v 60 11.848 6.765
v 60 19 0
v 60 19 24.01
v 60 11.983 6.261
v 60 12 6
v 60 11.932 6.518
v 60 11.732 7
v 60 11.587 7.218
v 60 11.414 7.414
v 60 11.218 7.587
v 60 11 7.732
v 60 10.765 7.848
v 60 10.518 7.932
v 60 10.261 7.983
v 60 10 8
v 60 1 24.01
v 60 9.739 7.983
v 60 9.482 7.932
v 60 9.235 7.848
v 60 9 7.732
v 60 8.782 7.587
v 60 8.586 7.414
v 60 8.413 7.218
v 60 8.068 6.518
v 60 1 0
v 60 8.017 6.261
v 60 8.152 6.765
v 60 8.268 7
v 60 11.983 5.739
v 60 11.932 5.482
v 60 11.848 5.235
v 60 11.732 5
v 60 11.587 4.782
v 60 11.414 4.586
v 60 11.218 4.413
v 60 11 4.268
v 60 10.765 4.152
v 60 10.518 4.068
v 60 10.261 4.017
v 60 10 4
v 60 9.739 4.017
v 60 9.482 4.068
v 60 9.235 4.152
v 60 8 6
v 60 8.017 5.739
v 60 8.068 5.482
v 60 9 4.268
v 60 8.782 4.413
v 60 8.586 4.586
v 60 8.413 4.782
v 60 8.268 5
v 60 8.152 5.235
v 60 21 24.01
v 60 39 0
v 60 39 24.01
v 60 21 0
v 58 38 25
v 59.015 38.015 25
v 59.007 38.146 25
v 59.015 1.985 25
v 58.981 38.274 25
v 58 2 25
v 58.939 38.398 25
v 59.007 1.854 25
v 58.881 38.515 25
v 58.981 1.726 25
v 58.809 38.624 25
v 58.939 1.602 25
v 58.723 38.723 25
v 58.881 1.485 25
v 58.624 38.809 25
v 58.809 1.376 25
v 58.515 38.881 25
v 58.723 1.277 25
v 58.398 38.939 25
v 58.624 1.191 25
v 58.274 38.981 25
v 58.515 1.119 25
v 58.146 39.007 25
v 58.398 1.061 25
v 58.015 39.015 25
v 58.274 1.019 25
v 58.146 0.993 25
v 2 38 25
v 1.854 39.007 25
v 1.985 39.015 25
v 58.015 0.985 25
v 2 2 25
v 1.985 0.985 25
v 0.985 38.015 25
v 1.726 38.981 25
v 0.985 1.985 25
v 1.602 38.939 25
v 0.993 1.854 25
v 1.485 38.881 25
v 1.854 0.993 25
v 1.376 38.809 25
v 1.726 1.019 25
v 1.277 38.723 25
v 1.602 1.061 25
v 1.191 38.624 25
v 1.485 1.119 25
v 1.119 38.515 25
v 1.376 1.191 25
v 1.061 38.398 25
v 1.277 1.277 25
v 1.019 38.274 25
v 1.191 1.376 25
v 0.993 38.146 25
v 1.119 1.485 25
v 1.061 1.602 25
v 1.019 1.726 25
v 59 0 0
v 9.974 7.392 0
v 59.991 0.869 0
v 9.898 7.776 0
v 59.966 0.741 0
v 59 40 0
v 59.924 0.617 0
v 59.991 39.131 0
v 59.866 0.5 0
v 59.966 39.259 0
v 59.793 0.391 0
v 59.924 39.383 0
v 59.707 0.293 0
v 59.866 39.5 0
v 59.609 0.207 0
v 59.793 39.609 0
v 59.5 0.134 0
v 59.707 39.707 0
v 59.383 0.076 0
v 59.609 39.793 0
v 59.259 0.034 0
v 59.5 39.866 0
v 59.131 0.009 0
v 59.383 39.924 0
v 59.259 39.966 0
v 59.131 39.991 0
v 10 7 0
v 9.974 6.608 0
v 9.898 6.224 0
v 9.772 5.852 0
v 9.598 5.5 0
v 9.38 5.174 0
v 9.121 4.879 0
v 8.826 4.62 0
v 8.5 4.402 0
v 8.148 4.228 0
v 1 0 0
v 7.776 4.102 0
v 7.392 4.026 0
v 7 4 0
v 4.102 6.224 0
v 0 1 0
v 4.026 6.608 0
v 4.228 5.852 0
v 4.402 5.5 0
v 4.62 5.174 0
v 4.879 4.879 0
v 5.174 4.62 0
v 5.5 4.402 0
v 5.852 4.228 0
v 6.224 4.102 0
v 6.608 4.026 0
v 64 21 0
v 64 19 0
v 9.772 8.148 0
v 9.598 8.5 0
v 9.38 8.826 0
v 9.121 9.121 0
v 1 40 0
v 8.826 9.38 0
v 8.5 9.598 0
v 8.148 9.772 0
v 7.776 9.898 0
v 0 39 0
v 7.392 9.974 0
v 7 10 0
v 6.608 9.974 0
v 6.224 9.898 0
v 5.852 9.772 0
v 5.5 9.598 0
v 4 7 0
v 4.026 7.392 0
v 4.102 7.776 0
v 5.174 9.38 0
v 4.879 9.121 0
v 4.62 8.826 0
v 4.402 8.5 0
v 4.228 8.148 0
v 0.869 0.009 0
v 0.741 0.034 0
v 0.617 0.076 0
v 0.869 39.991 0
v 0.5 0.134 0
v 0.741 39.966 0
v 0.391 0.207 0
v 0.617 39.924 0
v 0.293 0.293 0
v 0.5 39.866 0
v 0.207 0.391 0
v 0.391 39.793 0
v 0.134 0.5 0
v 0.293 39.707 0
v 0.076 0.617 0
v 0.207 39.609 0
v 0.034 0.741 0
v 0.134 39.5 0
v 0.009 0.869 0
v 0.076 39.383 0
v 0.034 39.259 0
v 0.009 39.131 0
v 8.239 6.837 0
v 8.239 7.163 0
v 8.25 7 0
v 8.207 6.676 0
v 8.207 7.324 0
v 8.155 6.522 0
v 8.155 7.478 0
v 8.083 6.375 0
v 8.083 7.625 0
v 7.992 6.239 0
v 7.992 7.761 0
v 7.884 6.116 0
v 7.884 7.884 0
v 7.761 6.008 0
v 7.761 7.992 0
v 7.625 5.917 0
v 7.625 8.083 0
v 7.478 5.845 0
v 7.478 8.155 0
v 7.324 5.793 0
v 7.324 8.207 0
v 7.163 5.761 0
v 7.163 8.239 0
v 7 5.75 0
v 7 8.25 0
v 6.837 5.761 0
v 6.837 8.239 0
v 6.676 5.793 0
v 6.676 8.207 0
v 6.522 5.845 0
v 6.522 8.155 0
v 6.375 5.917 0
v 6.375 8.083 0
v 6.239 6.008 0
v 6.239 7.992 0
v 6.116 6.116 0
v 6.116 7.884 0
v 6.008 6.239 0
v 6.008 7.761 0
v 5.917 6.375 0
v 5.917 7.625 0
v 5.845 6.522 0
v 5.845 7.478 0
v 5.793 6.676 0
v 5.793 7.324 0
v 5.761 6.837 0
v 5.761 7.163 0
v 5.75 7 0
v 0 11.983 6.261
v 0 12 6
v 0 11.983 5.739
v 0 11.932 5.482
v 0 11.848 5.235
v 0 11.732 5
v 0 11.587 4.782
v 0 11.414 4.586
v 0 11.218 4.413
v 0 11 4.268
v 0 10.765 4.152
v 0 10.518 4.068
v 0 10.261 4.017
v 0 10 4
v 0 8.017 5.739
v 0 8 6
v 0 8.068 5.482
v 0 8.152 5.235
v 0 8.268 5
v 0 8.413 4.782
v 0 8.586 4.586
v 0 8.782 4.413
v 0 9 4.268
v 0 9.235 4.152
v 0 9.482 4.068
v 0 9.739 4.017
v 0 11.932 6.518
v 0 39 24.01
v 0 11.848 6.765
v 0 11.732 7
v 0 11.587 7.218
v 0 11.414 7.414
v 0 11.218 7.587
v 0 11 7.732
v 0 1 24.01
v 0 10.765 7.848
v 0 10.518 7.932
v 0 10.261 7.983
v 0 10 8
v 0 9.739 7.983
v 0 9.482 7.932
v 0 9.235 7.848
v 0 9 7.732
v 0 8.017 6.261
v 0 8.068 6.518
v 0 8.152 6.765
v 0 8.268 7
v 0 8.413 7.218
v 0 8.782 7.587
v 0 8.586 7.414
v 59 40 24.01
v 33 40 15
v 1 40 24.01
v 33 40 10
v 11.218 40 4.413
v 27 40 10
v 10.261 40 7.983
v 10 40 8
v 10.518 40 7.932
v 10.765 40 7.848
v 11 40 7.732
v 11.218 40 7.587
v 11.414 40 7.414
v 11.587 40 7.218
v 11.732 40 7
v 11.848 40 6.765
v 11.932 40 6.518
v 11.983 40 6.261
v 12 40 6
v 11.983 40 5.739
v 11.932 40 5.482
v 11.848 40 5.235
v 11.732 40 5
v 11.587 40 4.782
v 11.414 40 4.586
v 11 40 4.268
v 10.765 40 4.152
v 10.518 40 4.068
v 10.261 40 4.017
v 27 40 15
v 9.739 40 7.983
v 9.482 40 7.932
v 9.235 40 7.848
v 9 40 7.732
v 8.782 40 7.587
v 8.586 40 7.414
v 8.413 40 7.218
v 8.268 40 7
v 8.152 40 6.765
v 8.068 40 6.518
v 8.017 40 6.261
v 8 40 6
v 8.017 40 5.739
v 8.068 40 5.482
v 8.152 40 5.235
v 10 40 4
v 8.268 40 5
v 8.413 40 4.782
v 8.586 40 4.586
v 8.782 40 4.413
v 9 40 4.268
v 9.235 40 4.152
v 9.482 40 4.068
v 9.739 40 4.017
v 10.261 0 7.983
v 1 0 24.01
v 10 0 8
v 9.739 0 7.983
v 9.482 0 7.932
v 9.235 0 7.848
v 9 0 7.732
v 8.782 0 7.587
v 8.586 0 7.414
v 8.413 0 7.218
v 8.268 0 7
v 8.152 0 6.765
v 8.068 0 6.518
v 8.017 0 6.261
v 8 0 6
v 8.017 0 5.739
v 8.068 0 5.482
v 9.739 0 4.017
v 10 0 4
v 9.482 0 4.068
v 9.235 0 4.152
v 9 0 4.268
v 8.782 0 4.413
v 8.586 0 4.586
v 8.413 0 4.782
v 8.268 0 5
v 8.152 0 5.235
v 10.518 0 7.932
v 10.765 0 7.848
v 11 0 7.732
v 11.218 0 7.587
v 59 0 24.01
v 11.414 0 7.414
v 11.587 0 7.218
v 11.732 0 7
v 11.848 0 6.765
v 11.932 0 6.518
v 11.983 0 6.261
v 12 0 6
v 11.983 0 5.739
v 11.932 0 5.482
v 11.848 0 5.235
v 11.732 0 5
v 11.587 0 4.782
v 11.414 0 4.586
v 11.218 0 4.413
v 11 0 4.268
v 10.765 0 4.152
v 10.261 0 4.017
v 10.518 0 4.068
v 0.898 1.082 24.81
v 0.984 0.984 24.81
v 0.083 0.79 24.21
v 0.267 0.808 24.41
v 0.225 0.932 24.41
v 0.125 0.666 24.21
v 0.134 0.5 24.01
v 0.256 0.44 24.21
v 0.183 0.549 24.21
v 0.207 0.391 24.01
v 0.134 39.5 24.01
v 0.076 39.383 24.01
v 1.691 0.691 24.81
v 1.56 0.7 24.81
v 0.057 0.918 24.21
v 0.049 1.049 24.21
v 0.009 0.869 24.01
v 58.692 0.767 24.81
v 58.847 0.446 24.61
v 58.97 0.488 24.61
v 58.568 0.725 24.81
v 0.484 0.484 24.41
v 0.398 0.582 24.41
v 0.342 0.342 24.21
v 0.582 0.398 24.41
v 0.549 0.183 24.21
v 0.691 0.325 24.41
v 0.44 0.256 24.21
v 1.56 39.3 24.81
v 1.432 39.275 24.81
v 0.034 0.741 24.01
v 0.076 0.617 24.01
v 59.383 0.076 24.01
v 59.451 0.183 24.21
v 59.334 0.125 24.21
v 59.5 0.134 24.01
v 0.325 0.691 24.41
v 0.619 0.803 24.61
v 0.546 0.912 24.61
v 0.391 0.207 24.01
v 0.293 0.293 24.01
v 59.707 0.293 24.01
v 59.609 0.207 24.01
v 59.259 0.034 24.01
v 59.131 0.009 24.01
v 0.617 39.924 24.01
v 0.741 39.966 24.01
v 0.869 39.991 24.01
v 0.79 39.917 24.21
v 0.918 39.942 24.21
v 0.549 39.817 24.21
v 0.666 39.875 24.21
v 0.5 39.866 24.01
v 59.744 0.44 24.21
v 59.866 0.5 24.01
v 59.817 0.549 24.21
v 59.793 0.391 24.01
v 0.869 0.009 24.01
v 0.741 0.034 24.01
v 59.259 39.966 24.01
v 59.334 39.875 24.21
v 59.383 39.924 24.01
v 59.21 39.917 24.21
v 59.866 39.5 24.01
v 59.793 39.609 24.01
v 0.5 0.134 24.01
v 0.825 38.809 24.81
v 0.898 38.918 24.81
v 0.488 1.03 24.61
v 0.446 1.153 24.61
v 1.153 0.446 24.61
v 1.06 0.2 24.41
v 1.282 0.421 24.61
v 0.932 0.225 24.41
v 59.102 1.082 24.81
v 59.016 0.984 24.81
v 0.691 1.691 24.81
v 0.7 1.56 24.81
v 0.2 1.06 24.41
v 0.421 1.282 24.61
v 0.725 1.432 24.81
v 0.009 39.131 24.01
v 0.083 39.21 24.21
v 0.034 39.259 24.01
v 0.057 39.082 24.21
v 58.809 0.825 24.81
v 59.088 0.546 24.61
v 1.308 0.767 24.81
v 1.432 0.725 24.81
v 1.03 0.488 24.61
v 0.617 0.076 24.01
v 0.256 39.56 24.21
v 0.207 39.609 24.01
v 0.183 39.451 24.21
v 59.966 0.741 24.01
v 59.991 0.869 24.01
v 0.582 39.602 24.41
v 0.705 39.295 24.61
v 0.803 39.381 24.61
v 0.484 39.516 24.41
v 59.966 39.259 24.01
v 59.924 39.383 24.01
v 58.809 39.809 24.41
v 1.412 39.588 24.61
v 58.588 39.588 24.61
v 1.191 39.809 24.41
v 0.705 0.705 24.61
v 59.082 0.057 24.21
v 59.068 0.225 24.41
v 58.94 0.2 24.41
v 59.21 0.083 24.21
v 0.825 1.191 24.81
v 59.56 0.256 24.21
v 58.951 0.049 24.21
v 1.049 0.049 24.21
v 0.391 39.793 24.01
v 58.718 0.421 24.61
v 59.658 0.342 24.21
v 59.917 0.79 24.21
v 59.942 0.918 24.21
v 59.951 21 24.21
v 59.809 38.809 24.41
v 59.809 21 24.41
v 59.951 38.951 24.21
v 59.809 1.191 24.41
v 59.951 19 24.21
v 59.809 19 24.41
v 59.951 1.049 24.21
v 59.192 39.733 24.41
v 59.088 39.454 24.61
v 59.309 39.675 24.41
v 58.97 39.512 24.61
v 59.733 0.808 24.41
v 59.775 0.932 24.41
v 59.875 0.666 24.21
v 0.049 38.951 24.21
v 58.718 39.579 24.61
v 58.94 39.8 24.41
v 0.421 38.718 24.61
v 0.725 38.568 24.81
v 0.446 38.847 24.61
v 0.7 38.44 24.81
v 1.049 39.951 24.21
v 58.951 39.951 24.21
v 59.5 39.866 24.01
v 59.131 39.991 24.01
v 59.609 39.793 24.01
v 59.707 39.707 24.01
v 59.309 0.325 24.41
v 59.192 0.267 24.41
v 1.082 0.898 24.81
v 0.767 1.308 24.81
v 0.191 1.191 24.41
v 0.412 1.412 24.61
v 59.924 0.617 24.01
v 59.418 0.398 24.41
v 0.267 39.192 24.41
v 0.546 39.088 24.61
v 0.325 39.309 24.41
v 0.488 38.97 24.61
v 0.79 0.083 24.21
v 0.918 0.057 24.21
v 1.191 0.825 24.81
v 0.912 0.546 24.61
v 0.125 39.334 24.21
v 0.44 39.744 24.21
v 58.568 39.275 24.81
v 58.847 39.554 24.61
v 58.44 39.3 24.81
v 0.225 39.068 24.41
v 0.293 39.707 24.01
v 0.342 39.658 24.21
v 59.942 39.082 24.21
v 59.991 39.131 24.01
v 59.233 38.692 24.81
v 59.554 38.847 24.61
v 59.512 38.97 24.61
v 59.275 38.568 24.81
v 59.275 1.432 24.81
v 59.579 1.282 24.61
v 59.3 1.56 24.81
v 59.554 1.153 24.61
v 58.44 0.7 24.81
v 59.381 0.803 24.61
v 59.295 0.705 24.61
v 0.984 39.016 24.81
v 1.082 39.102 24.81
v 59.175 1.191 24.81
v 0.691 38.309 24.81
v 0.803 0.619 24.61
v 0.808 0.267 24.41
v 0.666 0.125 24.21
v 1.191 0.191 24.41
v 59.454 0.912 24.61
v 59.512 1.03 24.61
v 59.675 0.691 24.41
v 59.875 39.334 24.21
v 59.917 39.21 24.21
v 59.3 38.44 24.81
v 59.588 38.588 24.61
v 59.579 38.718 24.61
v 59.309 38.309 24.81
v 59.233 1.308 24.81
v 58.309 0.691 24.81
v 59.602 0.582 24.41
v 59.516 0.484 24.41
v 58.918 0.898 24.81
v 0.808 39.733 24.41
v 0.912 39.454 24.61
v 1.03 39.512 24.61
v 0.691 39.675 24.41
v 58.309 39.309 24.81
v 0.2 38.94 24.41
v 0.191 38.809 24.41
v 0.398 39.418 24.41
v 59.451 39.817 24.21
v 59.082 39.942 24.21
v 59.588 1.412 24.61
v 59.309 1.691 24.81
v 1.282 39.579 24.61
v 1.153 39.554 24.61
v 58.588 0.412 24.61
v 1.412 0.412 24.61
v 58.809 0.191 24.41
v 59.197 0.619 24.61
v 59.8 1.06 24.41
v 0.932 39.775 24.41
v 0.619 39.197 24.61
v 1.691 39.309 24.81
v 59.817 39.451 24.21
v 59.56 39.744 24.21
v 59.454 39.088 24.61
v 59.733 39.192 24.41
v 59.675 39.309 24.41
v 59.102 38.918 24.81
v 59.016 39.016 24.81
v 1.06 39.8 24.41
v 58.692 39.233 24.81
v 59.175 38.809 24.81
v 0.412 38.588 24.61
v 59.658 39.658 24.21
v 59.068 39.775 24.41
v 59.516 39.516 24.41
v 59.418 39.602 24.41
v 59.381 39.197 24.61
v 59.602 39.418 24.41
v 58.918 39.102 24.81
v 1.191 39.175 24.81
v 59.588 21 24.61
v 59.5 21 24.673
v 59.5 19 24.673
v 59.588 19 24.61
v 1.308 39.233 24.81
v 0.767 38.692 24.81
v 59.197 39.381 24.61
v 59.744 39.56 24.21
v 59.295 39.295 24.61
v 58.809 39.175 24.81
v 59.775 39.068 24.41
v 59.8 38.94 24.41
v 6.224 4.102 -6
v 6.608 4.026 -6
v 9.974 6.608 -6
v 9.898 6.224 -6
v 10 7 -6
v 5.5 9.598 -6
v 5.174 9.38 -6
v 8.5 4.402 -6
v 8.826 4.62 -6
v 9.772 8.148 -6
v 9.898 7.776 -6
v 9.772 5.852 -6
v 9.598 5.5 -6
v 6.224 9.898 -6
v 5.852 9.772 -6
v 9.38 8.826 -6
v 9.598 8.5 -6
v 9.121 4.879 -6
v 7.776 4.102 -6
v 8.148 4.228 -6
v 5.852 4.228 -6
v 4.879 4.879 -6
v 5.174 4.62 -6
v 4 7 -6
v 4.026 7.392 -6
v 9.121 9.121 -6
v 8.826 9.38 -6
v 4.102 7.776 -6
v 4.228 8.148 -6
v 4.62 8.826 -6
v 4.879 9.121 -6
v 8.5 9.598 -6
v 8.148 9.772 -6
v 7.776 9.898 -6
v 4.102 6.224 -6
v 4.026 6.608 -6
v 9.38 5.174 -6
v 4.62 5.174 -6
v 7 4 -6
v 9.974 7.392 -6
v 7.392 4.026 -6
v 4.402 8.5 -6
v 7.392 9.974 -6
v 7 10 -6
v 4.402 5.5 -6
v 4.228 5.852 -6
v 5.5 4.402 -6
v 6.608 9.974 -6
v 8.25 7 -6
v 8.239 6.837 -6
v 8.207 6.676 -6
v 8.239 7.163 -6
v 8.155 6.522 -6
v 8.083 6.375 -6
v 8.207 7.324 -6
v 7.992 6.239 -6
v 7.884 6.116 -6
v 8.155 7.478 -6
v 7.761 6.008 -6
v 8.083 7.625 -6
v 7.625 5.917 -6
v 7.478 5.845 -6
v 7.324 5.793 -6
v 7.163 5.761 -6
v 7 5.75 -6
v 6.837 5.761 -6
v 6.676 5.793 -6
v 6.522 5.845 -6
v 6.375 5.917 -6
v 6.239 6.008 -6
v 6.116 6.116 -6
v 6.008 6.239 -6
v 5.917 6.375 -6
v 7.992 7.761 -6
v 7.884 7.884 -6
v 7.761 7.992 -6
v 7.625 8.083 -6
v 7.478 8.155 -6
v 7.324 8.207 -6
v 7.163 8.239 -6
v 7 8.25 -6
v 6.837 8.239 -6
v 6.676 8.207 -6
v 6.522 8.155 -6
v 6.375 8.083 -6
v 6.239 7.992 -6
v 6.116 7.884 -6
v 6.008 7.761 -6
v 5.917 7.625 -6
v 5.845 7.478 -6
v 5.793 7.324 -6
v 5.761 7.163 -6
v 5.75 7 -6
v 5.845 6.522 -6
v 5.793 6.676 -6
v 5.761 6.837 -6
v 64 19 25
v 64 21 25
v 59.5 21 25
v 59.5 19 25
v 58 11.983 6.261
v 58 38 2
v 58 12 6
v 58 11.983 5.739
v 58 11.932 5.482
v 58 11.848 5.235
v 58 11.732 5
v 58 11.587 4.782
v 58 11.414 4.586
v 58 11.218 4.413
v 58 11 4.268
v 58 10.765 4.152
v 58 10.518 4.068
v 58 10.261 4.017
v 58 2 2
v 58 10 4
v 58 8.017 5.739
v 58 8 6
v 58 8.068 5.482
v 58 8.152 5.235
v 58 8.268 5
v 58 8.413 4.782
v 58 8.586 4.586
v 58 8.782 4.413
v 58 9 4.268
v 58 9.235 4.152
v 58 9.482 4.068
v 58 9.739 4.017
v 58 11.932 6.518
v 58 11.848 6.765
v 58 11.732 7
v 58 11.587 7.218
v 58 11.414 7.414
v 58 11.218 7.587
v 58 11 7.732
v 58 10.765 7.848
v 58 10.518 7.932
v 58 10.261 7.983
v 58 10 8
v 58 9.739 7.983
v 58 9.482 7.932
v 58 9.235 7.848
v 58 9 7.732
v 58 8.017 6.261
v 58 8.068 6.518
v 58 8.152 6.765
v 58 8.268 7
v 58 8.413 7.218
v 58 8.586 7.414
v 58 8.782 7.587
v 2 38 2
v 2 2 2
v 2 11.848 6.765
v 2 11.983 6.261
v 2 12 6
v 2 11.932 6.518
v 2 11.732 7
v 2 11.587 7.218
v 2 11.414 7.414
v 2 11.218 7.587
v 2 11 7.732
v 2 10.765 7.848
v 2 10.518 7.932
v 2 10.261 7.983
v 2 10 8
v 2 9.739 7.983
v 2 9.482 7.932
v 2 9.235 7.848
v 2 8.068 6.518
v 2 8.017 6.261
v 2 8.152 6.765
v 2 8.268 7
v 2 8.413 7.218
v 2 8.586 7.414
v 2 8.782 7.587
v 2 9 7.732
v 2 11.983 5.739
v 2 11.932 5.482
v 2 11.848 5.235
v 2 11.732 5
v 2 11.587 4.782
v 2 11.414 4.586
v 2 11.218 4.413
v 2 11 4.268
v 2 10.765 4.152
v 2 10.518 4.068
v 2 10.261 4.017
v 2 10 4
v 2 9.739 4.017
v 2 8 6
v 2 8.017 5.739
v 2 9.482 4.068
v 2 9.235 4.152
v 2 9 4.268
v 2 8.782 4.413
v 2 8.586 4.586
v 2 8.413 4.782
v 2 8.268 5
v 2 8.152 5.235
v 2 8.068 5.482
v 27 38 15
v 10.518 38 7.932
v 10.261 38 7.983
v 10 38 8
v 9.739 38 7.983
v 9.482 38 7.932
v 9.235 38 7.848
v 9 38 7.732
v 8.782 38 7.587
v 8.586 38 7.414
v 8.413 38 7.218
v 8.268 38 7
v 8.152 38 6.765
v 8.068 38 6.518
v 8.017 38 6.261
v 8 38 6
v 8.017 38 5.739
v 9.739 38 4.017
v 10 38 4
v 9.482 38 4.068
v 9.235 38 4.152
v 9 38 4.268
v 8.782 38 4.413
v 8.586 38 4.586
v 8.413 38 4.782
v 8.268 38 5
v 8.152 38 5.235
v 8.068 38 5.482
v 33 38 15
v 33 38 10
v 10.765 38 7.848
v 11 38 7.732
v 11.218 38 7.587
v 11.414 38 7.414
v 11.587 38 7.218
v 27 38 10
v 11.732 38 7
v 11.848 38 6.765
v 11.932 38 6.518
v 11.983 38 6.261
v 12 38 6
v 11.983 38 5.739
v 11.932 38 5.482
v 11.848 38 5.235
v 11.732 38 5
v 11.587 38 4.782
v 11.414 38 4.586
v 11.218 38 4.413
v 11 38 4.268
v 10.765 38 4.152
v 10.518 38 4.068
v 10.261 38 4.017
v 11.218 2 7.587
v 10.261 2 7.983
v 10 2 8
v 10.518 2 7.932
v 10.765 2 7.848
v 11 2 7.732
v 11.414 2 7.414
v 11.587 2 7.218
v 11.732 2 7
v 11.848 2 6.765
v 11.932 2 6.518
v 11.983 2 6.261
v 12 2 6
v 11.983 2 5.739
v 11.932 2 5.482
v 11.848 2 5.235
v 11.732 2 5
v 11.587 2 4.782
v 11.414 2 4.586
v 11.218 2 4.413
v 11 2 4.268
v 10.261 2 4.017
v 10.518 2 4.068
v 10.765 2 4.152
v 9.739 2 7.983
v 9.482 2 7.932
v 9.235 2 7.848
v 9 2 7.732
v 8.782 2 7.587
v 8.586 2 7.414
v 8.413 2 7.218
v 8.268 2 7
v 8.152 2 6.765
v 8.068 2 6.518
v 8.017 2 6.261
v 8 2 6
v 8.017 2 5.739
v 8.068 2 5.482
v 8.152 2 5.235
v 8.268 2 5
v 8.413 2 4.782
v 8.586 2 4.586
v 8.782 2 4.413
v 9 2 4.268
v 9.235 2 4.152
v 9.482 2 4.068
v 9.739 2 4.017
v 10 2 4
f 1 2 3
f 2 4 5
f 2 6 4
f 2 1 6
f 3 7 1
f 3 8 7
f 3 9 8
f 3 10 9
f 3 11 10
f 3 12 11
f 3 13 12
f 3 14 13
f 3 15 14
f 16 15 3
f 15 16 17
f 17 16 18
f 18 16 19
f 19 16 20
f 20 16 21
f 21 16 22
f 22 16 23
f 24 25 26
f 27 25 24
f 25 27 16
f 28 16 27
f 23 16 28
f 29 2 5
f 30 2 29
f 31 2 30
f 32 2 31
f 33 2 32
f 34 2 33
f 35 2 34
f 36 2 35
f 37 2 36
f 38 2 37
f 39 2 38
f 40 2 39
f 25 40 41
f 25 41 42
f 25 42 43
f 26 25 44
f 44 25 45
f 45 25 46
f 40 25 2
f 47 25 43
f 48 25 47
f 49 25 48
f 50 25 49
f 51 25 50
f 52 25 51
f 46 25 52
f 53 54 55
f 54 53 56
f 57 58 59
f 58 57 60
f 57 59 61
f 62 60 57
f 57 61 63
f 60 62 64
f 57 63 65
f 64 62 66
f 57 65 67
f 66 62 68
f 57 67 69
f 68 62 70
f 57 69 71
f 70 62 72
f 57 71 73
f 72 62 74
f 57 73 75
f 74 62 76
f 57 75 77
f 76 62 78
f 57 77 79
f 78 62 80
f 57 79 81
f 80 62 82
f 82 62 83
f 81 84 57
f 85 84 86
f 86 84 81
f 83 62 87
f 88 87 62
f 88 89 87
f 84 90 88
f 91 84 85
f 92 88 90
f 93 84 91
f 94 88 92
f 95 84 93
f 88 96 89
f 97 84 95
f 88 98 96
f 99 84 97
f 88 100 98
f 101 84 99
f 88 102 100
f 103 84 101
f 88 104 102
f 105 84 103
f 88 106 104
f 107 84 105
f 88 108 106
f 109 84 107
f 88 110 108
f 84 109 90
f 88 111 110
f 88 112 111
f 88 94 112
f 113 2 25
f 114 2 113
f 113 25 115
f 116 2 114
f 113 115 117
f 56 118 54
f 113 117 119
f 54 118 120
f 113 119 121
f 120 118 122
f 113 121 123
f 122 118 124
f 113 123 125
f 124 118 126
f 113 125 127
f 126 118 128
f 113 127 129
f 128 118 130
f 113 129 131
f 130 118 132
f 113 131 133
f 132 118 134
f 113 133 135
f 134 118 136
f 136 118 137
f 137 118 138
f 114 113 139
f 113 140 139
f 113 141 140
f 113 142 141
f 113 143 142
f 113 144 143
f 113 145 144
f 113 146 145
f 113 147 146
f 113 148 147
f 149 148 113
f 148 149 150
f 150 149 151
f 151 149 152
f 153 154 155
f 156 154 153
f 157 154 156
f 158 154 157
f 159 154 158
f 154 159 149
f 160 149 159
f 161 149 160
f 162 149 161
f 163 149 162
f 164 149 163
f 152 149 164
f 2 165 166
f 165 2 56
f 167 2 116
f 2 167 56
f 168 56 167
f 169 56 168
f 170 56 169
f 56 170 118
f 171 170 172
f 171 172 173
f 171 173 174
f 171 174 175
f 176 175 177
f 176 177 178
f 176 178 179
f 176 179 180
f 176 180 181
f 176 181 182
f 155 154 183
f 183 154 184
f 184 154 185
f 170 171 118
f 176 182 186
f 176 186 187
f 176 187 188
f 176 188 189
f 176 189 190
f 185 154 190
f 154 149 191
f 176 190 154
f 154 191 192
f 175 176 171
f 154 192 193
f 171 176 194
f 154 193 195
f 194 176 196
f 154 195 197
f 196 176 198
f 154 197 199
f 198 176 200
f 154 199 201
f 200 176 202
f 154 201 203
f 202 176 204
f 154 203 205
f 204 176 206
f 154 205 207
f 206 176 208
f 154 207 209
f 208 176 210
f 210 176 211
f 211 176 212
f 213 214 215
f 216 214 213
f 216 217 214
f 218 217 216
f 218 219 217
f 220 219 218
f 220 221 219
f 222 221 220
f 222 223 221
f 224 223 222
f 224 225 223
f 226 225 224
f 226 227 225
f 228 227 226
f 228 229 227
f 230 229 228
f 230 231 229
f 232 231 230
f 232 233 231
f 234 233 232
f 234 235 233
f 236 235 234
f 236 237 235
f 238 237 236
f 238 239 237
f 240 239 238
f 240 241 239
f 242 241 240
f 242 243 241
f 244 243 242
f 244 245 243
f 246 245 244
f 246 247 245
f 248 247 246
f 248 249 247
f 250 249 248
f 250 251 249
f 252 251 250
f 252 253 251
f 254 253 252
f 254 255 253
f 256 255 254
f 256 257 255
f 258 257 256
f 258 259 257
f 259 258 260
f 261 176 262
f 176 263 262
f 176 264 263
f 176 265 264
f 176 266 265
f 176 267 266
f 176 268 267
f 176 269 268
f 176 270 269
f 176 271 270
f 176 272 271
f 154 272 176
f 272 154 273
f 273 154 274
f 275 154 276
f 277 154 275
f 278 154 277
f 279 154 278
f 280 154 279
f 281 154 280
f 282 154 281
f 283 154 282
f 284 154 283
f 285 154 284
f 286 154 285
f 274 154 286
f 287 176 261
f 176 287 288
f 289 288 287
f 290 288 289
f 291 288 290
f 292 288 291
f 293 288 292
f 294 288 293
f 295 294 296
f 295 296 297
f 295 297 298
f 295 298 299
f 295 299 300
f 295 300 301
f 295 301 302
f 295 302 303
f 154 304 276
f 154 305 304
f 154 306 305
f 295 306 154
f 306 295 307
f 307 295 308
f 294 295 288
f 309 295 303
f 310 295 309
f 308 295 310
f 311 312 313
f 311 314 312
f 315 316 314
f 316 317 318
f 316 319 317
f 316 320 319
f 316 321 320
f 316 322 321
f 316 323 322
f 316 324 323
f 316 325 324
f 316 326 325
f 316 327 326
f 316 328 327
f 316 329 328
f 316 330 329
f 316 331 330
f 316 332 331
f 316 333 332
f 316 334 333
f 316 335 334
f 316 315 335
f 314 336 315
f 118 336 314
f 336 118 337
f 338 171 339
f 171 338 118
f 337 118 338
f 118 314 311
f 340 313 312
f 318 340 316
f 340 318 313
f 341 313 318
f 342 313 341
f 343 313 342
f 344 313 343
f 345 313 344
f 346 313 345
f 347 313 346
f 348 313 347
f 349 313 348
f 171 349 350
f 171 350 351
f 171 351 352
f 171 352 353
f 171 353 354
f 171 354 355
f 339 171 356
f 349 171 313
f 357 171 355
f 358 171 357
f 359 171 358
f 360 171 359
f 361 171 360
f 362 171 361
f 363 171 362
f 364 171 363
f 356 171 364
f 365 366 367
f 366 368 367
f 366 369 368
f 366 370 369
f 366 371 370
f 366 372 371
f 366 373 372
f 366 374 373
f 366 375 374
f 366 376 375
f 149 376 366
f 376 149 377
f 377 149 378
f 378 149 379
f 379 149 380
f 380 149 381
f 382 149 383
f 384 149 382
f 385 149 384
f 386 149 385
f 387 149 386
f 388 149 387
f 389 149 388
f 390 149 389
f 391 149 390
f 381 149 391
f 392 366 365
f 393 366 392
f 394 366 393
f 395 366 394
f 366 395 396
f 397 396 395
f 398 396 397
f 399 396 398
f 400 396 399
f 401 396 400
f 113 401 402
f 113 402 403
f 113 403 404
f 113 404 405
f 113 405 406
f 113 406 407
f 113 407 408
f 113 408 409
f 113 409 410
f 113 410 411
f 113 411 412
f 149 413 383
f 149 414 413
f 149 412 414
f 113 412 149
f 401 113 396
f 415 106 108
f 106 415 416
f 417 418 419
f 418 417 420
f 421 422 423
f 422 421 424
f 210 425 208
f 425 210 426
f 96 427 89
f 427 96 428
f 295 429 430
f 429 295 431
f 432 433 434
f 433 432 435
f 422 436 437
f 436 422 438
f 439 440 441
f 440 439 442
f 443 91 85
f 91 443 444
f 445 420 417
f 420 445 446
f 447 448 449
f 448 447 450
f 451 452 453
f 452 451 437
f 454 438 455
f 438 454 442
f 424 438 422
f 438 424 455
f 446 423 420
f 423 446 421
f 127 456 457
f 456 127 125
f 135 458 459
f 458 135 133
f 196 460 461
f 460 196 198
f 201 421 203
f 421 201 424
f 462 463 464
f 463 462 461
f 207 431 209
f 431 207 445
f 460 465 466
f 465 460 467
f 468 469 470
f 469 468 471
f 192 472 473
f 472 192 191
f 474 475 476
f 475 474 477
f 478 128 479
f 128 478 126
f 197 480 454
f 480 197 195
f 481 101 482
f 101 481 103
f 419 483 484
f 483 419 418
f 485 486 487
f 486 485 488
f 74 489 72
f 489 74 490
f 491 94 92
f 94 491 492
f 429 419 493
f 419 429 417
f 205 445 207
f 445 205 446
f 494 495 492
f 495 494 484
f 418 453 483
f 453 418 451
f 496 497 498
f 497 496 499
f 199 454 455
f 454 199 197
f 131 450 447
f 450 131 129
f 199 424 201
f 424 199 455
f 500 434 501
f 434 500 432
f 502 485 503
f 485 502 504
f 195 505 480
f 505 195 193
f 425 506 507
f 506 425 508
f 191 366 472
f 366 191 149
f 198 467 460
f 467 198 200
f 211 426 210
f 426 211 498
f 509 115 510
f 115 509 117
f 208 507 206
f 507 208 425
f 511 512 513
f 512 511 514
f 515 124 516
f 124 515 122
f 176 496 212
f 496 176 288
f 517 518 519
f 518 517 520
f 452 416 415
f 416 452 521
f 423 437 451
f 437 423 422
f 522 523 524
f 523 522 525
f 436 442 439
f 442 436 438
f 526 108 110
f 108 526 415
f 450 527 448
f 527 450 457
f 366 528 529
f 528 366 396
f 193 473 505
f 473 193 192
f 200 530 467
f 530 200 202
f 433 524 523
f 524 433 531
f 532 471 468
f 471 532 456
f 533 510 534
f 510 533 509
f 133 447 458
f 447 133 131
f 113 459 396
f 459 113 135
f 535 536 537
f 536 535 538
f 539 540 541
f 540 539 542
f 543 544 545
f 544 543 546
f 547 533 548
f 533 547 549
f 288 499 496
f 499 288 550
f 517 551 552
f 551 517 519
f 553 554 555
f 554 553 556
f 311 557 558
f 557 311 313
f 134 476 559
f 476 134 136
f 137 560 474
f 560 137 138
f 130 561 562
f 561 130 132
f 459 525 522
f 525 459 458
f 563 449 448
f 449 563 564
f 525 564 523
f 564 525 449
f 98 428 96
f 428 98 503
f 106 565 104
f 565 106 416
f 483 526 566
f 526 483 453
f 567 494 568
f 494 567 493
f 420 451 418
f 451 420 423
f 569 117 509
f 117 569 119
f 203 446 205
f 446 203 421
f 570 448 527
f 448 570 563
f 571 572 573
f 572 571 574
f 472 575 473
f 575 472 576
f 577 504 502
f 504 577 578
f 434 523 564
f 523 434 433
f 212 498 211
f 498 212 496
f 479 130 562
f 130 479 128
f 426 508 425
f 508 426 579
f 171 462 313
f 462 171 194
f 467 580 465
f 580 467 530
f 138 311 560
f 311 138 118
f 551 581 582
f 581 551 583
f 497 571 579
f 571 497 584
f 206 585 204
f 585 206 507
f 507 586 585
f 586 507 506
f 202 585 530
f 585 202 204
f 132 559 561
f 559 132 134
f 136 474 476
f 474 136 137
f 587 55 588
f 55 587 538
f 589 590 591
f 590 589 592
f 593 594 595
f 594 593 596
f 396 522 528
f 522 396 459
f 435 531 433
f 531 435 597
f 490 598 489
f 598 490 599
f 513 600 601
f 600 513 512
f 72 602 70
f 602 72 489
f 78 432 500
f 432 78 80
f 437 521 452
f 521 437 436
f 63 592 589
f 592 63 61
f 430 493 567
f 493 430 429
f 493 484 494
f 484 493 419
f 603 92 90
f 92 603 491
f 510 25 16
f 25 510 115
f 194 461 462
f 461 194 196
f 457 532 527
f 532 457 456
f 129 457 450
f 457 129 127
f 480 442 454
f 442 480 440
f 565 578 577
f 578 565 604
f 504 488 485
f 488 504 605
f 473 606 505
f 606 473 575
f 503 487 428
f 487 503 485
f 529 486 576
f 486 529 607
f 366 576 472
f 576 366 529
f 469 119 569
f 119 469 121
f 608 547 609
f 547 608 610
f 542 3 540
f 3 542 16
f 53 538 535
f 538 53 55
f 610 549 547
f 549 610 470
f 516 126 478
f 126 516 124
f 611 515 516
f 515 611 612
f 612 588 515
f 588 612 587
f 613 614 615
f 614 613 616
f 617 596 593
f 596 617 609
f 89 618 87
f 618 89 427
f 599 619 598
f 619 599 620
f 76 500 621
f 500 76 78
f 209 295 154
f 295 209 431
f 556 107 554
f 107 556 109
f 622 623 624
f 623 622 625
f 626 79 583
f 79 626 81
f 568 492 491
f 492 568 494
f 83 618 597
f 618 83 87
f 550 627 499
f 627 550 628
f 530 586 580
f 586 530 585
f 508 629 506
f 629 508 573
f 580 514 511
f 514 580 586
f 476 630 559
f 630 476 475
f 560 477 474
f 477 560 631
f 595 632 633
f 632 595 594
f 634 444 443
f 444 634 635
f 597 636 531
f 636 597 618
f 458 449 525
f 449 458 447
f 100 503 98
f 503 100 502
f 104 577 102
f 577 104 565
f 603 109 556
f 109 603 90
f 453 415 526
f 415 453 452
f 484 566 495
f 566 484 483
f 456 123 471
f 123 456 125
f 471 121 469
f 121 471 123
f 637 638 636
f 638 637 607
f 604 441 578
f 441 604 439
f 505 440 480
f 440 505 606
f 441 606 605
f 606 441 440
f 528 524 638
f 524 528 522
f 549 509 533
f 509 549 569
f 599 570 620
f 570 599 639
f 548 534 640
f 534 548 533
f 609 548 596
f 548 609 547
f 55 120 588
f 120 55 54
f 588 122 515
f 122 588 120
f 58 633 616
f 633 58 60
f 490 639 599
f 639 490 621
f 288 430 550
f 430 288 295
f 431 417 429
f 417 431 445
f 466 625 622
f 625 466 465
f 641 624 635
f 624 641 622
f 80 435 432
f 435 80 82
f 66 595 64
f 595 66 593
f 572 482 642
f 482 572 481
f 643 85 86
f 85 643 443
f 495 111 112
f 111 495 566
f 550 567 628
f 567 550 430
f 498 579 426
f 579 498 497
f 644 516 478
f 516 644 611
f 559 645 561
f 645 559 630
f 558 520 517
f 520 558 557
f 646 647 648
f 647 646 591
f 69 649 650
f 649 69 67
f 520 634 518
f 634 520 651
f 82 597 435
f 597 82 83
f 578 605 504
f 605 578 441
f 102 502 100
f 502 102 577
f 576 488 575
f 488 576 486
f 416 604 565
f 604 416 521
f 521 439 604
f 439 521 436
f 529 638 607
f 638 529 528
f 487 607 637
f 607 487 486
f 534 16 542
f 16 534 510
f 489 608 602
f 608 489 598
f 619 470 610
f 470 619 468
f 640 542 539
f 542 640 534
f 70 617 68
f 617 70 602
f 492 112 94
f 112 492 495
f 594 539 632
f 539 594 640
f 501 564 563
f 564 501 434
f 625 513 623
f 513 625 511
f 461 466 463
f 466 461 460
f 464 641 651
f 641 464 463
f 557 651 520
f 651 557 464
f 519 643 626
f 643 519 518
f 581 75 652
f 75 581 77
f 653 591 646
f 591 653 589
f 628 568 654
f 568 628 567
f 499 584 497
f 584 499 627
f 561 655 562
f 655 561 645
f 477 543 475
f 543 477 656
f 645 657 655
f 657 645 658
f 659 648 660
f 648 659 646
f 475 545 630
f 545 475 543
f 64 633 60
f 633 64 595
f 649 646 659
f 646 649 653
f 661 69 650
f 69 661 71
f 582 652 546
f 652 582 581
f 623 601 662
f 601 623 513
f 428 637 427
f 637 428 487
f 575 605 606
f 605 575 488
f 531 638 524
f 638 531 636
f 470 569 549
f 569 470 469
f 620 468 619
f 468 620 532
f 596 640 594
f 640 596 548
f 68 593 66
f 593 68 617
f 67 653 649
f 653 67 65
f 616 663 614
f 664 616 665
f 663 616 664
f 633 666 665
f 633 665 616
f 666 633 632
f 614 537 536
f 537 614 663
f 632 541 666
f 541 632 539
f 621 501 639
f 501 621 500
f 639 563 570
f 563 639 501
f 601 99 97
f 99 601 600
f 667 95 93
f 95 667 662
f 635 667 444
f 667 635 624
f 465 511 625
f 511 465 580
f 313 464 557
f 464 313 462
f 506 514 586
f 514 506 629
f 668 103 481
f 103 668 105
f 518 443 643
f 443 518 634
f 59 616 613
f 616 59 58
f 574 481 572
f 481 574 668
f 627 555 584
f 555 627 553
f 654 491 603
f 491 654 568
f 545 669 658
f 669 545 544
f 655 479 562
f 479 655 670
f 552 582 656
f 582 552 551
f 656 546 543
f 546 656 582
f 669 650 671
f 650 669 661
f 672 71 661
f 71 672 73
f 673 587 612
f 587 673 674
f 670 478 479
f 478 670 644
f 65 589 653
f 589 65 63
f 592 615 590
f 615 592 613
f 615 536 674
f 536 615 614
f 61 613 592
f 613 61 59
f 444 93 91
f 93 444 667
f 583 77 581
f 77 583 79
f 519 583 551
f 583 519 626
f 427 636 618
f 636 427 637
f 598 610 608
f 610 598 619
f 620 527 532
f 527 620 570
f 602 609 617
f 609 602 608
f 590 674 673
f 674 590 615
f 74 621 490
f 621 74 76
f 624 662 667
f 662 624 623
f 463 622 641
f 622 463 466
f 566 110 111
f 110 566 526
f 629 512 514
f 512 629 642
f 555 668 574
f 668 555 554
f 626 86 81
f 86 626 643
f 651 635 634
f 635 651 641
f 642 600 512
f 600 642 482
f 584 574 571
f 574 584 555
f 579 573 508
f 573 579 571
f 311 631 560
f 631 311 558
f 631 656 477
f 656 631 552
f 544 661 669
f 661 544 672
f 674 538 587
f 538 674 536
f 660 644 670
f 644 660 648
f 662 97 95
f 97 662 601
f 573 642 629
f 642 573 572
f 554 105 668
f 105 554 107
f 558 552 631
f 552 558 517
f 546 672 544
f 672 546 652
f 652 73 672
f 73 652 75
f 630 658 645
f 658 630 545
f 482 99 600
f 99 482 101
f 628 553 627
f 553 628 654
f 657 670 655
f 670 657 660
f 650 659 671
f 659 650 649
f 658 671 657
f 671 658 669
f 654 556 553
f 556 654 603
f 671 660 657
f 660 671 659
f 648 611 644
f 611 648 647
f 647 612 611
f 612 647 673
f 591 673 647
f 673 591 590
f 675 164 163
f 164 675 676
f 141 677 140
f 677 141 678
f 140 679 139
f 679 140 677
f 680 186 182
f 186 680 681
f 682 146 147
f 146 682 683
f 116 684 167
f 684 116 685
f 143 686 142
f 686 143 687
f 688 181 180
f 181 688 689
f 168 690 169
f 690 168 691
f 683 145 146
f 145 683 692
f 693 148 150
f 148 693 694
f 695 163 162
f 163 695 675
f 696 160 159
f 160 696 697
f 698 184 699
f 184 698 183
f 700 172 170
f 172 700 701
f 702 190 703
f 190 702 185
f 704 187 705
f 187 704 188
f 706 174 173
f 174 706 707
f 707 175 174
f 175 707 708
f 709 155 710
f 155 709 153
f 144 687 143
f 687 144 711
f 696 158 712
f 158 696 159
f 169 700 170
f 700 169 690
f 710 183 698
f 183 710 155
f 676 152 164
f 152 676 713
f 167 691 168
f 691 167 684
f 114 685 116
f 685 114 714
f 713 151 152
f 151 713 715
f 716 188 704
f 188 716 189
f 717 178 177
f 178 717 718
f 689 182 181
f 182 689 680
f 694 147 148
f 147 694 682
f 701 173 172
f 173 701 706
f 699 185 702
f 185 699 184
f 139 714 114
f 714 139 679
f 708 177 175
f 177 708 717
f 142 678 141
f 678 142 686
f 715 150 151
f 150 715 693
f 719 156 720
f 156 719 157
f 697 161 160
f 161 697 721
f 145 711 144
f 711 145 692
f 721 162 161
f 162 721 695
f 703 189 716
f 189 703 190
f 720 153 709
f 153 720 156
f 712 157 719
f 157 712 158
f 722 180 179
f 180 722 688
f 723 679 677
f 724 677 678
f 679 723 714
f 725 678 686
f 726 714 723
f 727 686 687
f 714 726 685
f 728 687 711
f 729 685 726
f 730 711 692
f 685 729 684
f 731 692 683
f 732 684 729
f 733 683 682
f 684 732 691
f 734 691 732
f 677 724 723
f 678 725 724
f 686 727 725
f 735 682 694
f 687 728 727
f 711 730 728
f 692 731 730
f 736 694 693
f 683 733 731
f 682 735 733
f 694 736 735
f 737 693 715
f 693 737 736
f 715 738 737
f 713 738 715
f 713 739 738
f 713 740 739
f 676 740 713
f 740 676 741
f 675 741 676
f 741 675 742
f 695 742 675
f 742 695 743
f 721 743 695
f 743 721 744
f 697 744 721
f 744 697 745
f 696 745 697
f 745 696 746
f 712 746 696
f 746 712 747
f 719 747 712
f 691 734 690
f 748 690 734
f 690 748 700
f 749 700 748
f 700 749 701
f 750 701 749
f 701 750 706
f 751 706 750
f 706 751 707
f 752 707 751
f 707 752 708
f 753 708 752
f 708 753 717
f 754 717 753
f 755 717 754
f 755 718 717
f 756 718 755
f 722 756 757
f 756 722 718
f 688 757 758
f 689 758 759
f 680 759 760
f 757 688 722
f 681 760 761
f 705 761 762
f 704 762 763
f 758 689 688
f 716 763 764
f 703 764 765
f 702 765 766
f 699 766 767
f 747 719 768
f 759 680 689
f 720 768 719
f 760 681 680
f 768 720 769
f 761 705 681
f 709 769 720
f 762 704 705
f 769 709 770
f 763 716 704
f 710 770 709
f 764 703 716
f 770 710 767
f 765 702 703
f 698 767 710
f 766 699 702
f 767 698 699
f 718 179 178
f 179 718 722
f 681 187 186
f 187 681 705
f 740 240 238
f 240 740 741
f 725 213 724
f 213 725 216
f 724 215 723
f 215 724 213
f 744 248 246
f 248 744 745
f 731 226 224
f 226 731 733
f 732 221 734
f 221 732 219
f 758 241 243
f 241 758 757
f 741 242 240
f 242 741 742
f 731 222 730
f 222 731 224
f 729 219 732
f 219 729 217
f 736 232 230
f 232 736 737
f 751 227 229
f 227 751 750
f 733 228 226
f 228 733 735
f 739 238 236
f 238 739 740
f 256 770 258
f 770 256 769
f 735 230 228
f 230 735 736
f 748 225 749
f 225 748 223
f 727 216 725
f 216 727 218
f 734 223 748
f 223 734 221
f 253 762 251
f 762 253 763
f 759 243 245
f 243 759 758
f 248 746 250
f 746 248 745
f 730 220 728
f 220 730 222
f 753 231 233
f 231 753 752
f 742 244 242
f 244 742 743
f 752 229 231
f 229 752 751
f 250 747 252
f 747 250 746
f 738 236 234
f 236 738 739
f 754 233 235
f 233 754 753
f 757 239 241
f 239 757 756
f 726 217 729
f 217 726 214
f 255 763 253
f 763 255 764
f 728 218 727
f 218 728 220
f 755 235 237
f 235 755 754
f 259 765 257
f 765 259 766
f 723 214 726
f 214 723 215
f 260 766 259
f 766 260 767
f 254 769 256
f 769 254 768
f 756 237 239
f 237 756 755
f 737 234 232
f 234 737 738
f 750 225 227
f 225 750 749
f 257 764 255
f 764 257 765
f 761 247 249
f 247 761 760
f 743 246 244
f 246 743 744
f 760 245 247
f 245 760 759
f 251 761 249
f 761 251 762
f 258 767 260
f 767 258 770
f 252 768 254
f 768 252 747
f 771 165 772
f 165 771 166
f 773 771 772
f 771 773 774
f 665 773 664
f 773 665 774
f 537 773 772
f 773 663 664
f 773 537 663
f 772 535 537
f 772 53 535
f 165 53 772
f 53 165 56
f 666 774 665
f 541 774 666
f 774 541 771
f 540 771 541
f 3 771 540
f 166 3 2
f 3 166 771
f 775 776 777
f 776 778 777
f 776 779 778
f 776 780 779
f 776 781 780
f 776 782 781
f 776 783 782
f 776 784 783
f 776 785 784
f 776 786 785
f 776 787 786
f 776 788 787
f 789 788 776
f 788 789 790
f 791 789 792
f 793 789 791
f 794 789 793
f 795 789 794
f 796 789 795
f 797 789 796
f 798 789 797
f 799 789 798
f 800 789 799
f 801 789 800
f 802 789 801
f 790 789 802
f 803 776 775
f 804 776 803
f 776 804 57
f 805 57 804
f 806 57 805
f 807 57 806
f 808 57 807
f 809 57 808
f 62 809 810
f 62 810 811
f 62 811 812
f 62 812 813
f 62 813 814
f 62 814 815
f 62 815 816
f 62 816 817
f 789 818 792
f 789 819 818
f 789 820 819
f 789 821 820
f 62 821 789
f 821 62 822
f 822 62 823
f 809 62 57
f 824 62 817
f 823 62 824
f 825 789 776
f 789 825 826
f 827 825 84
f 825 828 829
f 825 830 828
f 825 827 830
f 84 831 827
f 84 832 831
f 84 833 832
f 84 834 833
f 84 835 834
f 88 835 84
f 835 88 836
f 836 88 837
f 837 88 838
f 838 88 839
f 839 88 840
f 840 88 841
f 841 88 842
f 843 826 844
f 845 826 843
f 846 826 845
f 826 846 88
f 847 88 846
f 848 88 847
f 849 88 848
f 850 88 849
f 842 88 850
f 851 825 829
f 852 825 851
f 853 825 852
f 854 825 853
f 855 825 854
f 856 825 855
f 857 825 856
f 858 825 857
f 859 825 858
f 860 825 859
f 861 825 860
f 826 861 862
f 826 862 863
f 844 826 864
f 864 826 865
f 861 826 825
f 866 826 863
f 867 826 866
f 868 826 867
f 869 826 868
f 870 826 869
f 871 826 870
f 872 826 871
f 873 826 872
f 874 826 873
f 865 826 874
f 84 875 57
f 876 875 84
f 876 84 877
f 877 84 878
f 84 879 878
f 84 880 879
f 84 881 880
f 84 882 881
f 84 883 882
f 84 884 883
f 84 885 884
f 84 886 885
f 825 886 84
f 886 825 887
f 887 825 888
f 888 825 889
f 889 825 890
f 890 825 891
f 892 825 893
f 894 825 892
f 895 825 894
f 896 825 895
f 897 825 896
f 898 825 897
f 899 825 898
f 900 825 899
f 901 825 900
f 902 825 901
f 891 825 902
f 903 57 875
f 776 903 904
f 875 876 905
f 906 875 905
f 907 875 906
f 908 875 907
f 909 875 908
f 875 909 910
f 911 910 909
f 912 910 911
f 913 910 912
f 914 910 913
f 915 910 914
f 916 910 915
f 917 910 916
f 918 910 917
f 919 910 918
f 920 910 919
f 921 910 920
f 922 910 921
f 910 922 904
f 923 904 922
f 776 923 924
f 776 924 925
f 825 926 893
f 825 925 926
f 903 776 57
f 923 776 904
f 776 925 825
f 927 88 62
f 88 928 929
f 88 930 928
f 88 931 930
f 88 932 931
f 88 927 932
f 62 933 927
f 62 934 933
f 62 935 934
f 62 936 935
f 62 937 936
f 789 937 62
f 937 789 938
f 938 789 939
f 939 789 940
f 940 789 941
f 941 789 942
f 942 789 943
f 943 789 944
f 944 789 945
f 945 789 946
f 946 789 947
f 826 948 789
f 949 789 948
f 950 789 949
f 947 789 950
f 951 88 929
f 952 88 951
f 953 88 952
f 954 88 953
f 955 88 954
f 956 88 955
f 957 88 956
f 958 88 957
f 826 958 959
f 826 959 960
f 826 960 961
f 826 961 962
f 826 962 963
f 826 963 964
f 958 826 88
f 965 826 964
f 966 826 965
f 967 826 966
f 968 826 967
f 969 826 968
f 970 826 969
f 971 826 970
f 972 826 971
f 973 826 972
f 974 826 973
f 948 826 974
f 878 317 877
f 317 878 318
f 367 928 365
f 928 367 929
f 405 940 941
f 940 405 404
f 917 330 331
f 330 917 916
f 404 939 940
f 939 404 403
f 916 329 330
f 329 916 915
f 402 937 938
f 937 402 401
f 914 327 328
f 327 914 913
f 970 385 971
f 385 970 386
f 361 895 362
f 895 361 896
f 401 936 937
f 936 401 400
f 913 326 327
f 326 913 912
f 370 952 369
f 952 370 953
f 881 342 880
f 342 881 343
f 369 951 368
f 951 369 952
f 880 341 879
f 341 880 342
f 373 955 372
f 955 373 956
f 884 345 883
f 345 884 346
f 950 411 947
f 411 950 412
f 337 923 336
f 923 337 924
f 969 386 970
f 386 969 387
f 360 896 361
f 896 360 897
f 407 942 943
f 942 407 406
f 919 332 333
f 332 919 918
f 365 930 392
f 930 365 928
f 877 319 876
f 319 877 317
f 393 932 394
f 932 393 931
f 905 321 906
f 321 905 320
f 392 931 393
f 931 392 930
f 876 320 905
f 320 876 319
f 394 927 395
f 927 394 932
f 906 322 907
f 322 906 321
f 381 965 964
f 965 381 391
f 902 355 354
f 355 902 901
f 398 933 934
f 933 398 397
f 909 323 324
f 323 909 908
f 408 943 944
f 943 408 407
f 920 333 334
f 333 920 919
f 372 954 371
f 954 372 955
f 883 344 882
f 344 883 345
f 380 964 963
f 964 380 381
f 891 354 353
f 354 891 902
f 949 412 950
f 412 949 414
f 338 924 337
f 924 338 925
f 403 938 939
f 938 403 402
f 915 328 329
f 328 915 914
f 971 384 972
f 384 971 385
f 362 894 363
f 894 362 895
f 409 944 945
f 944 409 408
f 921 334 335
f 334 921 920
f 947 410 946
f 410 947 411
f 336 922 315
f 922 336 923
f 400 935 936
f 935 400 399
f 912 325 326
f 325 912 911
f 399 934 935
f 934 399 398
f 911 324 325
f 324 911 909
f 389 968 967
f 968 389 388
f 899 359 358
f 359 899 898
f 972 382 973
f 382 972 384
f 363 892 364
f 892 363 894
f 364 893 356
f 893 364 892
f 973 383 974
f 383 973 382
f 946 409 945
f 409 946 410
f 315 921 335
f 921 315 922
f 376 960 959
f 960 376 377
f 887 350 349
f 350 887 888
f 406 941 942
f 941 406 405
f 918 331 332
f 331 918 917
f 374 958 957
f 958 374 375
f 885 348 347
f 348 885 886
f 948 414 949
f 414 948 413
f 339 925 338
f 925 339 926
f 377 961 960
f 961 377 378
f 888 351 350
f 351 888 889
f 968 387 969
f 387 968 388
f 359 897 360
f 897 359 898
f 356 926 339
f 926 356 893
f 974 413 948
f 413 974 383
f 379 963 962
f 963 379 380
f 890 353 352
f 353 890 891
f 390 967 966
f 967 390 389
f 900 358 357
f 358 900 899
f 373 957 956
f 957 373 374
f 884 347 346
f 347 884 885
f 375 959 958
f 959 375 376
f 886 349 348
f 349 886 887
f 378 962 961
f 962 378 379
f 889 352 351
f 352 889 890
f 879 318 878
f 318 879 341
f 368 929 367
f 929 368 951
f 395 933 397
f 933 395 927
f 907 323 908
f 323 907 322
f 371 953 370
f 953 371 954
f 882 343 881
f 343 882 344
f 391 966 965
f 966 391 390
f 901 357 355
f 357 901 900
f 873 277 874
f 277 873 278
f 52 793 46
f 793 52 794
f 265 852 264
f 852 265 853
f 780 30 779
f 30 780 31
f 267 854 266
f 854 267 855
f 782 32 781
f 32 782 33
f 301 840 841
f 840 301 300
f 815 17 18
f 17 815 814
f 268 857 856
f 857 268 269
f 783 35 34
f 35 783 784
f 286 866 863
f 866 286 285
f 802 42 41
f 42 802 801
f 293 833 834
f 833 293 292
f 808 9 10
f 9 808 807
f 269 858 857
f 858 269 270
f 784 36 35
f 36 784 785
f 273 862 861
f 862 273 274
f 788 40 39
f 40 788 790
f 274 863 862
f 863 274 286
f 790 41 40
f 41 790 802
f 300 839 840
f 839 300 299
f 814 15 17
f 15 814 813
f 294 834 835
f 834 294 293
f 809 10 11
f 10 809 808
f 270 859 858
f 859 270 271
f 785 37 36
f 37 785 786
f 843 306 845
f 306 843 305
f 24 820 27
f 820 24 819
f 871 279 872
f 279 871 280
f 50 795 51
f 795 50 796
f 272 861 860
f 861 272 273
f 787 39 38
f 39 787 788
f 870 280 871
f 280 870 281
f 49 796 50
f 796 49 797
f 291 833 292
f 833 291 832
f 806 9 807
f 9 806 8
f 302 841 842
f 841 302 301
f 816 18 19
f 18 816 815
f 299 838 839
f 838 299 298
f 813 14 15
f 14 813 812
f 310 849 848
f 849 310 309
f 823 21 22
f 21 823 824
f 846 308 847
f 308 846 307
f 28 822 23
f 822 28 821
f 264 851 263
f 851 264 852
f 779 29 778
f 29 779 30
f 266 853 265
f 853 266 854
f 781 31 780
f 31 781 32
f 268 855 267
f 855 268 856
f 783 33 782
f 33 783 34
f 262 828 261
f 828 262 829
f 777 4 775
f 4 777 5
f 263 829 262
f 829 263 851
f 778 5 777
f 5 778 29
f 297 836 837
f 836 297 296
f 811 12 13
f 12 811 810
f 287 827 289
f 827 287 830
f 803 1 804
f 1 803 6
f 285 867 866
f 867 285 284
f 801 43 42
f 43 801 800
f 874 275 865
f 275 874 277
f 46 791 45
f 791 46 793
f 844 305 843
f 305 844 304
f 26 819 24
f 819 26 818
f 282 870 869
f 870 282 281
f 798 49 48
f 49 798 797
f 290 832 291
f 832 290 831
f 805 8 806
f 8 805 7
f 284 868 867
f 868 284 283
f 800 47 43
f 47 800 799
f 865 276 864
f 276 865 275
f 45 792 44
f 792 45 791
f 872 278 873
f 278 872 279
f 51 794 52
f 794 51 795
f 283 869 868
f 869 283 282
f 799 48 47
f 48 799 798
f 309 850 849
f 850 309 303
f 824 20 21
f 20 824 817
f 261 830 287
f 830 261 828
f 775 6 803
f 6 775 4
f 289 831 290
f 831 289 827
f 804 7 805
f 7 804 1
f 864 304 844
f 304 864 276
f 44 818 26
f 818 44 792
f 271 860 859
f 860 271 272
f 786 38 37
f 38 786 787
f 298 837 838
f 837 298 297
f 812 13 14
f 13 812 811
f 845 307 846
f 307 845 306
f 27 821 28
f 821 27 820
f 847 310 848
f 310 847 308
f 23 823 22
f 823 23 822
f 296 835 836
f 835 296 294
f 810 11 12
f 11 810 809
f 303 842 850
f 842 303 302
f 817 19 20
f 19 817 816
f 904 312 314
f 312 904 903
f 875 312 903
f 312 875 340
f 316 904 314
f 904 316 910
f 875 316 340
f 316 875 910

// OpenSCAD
// units=mm — generated by scad_emitter.py
// part=unnamed
$fn = 48;

difference() { union() { intersection() { cube([60, 40, 25]); hull() { translate([1, 1, 0]) linear_extrude(height=0.01) offset(r=1) square([58, 38]); translate([2, 2, 25]) linear_extrude(height=0.01) offset(r=1) square([56, 36]); translate([1.691, 1.691, 24.8]) linear_extrude(height=0.01) offset(r=1) square([56.618, 36.618]); translate([1.4122, 1.4122, 24.6]) linear_extrude(height=0.01) offset(r=1) square([57.1756, 37.1756]); translate([1.191, 1.191, 24.4]) linear_extrude(height=0.01) offset(r=1) square([57.618, 37.618]); translate([1.0489, 1.0489, 24.2]) linear_extrude(height=0.01) offset(r=1) square([57.9021, 37.9021]); translate([1, 1, 24]) linear_extrude(height=0.01) offset(r=1) square([58, 38]); } } difference() { translate([7, 7, 0.5]) rotate([180, 0, 0]) cylinder(h=6.5, r=3, $fn=$fn); translate([7, 7, 0.5]) rotate([180, 0, 0]) cylinder(h=7, r=1.25, $fn=$fn); } translate([59.5, 19, 0]) cube([4.5, 2, 25]); } translate([2, 2, 2]) cube([56, 36, 25]); translate([10, -0.5, 6]) rotate([-90, 0, 0]) cylinder(h=41, r=2, $fn=$fn); translate([-0.5, 10, 6]) rotate([0, 90, 0]) cylinder(h=61, r=2, $fn=$fn); translate([27, 37.5, 10]) cube([6, 3, 5]); }
